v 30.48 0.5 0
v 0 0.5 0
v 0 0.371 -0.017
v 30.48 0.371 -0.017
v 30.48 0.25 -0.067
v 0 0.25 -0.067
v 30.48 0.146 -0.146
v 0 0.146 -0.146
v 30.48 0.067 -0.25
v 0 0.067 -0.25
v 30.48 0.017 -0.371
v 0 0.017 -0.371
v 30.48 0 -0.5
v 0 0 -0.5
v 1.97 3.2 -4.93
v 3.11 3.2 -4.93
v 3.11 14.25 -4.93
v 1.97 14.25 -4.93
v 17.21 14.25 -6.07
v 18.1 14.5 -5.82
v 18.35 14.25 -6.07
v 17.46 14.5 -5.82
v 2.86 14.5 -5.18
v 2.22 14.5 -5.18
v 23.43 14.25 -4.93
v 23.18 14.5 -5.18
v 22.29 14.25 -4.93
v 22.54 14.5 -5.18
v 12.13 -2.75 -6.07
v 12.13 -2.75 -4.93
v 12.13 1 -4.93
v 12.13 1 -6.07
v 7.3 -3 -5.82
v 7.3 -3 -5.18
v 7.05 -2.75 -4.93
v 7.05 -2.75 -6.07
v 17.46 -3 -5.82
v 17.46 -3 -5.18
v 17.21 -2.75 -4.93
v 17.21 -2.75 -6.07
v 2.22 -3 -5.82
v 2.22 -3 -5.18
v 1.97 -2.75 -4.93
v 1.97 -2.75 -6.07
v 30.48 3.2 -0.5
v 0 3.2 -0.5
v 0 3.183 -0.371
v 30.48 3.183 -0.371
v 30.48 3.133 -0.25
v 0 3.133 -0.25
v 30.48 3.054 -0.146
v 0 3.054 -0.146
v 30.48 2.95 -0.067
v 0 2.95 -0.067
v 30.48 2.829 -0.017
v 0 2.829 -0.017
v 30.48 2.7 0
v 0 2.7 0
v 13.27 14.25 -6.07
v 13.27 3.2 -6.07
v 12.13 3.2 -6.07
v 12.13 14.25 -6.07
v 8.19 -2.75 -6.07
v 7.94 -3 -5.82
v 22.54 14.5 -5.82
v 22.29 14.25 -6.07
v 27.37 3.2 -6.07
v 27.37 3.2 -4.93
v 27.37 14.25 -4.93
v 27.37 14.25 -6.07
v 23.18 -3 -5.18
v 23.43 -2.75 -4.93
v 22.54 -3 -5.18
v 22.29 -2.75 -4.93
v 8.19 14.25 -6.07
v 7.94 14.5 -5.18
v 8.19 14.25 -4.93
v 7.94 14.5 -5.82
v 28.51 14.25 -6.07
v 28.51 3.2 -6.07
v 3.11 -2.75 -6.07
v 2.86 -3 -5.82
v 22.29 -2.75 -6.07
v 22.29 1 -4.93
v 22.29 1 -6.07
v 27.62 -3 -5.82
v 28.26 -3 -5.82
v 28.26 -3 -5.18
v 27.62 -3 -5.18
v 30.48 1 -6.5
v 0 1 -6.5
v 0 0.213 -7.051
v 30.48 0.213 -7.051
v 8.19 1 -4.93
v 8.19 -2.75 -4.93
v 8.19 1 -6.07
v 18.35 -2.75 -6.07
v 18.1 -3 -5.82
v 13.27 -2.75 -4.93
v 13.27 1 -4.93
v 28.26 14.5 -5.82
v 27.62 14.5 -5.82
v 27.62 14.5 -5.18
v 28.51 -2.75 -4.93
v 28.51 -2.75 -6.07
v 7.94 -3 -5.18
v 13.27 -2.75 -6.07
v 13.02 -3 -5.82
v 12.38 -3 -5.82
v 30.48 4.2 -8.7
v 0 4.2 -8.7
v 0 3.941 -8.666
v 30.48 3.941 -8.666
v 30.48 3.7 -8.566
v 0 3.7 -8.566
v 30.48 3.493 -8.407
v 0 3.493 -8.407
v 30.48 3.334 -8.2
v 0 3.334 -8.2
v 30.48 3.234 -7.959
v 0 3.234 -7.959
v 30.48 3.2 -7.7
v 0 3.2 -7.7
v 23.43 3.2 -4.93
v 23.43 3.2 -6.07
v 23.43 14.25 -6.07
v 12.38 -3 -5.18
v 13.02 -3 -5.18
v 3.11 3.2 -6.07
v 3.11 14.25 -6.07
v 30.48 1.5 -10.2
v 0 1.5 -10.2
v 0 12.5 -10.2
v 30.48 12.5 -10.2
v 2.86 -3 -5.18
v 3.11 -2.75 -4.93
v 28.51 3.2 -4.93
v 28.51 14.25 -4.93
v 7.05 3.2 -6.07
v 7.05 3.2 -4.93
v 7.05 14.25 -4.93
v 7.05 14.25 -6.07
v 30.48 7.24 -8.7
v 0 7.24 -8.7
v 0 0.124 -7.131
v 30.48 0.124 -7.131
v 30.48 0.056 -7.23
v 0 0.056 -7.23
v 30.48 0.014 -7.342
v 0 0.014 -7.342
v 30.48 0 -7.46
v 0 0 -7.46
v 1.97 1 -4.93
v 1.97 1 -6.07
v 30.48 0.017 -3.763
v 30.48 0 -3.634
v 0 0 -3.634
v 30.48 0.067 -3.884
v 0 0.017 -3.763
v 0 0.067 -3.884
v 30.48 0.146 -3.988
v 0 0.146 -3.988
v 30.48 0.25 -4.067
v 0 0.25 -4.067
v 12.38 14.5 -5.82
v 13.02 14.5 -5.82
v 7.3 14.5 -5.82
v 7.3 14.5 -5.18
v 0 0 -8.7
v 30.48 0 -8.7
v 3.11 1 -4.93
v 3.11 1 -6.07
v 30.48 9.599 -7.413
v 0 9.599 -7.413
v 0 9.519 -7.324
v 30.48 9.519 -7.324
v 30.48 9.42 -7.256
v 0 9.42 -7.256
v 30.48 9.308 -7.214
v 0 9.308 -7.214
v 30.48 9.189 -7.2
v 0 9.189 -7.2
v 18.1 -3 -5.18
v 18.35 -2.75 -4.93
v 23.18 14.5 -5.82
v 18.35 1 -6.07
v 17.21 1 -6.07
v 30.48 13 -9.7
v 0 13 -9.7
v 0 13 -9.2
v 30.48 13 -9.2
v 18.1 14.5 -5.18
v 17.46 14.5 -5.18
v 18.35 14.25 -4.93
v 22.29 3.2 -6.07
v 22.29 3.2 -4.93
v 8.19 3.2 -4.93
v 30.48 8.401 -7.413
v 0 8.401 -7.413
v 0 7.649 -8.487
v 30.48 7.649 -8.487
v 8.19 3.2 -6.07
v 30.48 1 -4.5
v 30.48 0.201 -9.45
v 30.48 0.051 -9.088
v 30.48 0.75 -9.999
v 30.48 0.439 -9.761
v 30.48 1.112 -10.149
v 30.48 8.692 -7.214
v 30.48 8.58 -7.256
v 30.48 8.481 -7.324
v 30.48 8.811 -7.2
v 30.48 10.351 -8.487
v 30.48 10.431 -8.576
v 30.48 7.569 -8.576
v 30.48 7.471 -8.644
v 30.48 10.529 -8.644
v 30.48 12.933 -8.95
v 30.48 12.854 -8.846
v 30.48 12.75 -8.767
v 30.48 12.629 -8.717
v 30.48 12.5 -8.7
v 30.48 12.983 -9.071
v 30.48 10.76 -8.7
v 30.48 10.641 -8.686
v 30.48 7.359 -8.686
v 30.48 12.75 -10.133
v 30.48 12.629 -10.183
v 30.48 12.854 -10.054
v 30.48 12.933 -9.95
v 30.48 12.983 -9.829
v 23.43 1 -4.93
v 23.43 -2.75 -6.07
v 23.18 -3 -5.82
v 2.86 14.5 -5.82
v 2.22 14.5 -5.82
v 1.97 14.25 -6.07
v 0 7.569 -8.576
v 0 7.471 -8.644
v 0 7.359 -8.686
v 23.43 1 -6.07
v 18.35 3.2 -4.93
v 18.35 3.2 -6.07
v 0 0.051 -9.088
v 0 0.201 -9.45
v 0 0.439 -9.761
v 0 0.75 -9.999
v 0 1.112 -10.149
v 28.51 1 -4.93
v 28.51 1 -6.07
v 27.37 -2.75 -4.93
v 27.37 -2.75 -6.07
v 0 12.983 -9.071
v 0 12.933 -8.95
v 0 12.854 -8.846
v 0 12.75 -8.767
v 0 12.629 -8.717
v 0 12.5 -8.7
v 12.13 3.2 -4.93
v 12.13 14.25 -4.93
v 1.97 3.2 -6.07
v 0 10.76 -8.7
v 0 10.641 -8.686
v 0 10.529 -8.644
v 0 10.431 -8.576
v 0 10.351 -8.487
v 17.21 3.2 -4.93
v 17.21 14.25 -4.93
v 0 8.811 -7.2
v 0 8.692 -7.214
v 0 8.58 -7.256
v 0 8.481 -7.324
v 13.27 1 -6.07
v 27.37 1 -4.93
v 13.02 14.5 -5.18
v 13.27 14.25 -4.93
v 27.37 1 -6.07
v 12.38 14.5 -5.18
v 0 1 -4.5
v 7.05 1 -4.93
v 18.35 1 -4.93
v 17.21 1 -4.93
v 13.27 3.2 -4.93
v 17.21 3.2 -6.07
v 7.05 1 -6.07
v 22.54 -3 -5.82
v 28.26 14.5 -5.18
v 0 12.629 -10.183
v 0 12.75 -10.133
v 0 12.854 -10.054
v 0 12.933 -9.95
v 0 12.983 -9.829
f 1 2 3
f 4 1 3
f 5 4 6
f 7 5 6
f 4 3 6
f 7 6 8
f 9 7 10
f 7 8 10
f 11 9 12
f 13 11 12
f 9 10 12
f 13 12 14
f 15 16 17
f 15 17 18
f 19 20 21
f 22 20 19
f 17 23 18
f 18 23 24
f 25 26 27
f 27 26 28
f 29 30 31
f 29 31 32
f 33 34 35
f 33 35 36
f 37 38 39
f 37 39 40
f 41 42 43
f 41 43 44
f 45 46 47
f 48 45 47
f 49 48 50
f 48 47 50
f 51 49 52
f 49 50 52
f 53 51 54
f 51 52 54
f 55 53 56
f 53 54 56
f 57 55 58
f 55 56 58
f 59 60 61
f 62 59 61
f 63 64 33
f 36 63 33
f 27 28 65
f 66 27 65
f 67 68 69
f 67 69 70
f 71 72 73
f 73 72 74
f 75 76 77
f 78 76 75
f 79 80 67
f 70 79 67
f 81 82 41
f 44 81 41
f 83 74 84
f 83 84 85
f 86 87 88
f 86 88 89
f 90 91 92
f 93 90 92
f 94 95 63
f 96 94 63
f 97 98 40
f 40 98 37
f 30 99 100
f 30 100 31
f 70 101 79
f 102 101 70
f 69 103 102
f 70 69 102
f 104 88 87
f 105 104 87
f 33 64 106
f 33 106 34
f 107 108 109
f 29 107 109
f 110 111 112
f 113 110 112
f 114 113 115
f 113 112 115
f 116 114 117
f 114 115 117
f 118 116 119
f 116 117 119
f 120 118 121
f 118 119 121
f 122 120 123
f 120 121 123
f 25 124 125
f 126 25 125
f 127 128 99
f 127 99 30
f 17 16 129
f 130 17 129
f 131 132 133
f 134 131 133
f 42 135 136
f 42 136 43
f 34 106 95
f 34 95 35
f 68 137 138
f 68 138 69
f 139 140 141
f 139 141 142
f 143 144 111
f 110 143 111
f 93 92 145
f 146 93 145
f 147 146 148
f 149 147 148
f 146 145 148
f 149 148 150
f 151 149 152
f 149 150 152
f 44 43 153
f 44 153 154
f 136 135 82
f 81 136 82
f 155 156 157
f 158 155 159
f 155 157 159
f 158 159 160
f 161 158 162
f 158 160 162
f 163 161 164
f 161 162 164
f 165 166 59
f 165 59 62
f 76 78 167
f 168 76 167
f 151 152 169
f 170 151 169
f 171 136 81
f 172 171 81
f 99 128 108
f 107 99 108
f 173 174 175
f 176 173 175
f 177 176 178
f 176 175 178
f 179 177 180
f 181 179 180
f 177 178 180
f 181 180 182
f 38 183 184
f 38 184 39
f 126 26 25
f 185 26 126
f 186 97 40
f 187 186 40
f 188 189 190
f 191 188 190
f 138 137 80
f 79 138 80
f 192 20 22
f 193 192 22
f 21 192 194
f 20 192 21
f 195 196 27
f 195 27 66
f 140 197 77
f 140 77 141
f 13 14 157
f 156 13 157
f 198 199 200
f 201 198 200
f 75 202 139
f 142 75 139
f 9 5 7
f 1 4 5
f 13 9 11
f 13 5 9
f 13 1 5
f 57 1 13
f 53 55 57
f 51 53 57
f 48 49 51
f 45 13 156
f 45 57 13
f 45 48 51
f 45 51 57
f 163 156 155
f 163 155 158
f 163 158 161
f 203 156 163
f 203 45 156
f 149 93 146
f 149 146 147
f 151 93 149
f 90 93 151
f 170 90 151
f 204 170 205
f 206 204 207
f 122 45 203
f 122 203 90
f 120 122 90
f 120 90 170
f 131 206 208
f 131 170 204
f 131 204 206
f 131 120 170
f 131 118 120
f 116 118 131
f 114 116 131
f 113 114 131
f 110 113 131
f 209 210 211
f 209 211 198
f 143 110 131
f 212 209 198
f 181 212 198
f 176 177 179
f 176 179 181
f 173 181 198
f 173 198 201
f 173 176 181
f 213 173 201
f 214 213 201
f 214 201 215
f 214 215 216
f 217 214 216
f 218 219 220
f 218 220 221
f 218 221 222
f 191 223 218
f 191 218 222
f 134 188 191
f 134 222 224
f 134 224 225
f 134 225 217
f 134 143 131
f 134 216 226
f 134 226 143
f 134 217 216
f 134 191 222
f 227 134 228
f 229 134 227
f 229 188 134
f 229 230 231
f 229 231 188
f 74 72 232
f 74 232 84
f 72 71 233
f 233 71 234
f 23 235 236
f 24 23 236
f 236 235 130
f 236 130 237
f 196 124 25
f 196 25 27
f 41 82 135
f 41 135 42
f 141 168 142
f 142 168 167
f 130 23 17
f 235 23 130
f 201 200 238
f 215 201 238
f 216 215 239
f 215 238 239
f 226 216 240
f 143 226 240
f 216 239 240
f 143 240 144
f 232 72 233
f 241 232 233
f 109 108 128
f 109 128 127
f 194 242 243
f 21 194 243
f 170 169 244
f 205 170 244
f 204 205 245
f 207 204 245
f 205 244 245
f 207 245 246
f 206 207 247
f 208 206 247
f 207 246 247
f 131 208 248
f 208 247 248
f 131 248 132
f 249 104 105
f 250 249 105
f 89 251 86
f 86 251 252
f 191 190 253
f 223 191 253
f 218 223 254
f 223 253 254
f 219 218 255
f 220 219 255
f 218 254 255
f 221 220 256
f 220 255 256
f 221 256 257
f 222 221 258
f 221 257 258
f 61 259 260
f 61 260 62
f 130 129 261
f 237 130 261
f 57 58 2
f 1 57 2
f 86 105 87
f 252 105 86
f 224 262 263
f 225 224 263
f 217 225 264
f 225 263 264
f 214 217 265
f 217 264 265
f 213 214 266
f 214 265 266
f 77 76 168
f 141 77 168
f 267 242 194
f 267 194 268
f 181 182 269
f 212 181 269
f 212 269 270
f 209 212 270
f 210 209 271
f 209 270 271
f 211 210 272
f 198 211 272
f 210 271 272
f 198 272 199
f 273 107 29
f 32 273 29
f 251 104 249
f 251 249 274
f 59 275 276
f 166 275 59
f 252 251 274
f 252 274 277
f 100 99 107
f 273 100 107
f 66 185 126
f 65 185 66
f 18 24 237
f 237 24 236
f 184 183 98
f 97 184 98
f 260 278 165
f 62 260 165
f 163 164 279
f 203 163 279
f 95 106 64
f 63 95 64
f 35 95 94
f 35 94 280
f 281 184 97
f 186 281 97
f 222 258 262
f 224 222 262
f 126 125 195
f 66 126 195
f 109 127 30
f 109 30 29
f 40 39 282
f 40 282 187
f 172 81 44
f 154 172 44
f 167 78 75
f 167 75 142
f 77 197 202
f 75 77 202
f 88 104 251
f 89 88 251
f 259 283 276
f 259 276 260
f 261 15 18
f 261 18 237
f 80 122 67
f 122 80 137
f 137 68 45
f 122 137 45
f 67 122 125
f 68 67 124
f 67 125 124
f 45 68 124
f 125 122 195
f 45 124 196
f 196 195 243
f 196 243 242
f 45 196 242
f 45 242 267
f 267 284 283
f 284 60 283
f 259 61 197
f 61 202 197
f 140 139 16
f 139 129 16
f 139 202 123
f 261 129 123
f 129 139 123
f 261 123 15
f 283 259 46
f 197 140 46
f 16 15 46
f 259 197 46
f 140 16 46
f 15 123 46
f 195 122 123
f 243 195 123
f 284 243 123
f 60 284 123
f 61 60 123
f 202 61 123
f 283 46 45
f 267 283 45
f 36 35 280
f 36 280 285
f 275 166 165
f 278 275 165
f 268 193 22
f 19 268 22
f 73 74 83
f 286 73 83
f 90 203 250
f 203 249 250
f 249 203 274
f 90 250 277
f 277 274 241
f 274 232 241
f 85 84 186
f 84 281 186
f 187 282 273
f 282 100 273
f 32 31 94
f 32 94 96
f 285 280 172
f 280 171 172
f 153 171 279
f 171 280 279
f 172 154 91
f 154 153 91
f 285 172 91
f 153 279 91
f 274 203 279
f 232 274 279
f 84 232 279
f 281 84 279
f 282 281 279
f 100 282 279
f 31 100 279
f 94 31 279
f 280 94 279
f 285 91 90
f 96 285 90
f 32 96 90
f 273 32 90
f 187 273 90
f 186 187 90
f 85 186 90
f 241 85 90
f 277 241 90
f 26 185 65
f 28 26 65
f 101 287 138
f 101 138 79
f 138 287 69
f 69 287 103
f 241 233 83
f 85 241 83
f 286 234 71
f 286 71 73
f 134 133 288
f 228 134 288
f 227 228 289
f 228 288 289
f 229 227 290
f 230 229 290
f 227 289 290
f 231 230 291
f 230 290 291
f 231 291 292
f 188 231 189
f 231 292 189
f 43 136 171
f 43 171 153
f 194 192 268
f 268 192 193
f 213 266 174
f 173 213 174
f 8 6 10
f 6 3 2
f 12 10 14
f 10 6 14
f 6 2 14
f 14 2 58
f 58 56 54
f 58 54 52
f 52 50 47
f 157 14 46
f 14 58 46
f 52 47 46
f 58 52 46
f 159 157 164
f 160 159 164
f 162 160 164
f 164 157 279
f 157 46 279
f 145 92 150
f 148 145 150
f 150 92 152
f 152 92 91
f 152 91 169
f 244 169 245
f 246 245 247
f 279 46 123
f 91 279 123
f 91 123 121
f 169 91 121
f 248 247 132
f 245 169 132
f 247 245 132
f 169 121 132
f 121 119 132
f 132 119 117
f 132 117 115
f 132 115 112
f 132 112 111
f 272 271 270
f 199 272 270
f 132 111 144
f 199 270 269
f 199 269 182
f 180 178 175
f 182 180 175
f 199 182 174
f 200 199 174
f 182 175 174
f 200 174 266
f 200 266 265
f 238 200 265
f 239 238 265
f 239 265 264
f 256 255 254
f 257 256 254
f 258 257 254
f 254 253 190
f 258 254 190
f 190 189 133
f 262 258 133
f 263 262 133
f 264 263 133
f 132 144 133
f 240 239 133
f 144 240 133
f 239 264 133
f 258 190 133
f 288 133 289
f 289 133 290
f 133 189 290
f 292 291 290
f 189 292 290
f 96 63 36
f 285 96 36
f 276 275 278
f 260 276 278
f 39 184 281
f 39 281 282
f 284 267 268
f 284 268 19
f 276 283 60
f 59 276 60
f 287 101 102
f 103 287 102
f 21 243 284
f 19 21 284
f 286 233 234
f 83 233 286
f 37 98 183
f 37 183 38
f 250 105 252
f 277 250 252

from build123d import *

# Parameters (mm, degrees)
BOSS_EXTRUDE1_DEPTH        = 30.48
SKETCH2_W                  = 1.14
SKETCH2_H                  = 1.14
BOSS_EXTRUDE2_DEPTH        = 17.5
CHAMFER1_SIZE              = 0.25
CHAMFER2_SIZE              = 0.25
LPATTERN3_COUNT            = 6
LPATTERN3_PITCH            = 5.08
CHAMFER1_OF_LPATTERN3_SIZE = 0.25
CHAMFER2_OF_LPATTERN3_SIZE = 0.25


with BuildPart() as part:
    # Sketch1 → Boss-Extrude1 (new body)
    with BuildSketch(Plane(origin=(0, 0, 0), x_dir=(0, 0, -1), z_dir=(1, 0, 0))):
        with BuildLine():
            Line((0, 2.7), (0, 0.5))
            ThreePointArc((0, 0.5), (0.146446609, 0.146446609), (0.5, 0))
            Line((0.5, 0), (3.633974596, 0))
            ThreePointArc((3.633974596, 0), (3.883974596, 0.066987298), (4.066987298, 0.25))
            Line((4.066987298, 0.25), (4.5, 1))
            Line((4.5, 1), (6.5, 1))
            Line((6.5, 1), (7.050915041, 0.213211782))
            ThreePointArc((7.050915041, 0.213211782), (7.229616757, 0.056494583), (7.460491063, 0))
            Line((7.460491063, 0), (8.7, 0))
            ThreePointArc((8.7, 0), (9.760660172, 0.439339828), (10.2, 1.5))
            Line((10.2, 1.5), (10.2, 12.5))
            ThreePointArc((10.2, 12.5), (10.053553391, 12.853553391), (9.7, 13))
            Line((9.7, 13), (9.2, 13))
            ThreePointArc((9.2, 13), (8.846446609, 12.853553391), (8.7, 12.5))
            Line((8.7, 12.5), (8.7, 10.760283525))
            ThreePointArc((8.7, 10.760283525), (8.643505417, 10.529409219), (8.486788218, 10.350707503))
            Line((8.486788218, 10.350707503), (7.413211782, 9.59898119))
            ThreePointArc((7.413211782, 9.59898119), (7.256494583, 9.420279474), (7.2, 9.189405167))
            Line((7.2, 9.189405167), (7.2, 8.810594833))
            ThreePointArc((7.2, 8.810594833), (7.256494583, 8.579720526), (7.413211782, 8.40101881))
            Line((7.413211782, 8.40101881), (8.486788218, 7.649292497))
            ThreePointArc((8.486788218, 7.649292497), (8.643505417, 7.470590781), (8.7, 7.239716475))
            Line((8.7, 7.239716475), (8.7, 4.2))
            ThreePointArc((8.7, 4.2), (8.407106781, 3.492893219), (7.7, 3.2))
            Line((7.7, 3.2), (0.5, 3.2))
            ThreePointArc((0.5, 3.2), (0.146446609, 3.053553391), (0, 2.7))
        make_face()
    extrude(amount=BOSS_EXTRUDE1_DEPTH)

    # Sketch2 → Boss-Extrude2 (add)
    with BuildSketch(Plane(origin=(0, -3, 0), x_dir=(-1, 0, 0), z_dir=(0, -1, 0))):
        with Locations((-27.94, 5.5)):
            Rectangle(SKETCH2_W, SKETCH2_H)
    boss_extrude2 = extrude(amount=-BOSS_EXTRUDE2_DEPTH)

    # Chamfer1
    chamfer1_edges = [part.edges().sort_by_distance(p)[0] for p in [
        (27.37, -3, -5.5),
        (27.94, -3, -6.07),
        (28.51, -3, -5.5),
        (27.94, -3, -4.93),
    ]]
    chamfer(chamfer1_edges, length=CHAMFER1_SIZE)

    # Chamfer2
    chamfer2_edges = [part.edges().sort_by_distance(p)[0] for p in [
        (27.37, 14.5, -5.5),
        (27.94, 14.5, -4.93),
        (28.51, 14.5, -5.5),
        (27.94, 14.5, -6.07),
    ]]
    chamfer(chamfer2_edges, length=CHAMFER2_SIZE)

    # LPattern3: Boss-Extrude2 ×6
    with Locations(*[(-i * LPATTERN3_PITCH, 0, 0) for i in range(1, LPATTERN3_COUNT)]):
        add(boss_extrude2)

    # Chamfer1 of LPattern3
    chamfer1_of_lpattern3_edges = [part.edges().sort_by_distance(p)[0] for p in [
        (22.29, -3, -5.5),
        (22.86, -3, -6.07),
        (23.43, -3, -5.5),
        (22.86, -3, -4.93),
        (17.21, -3, -5.5),
        (17.78, -3, -6.07),
        (18.35, -3, -5.5),
        (17.78, -3, -4.93),
        (12.13, -3, -5.5),
        (12.7, -3, -6.07),
        (13.27, -3, -5.5),
        (12.7, -3, -4.93),
        (7.05, -3, -5.5),
        (7.62, -3, -6.07),
        (8.19, -3, -5.5),
        (7.62, -3, -4.93),
        (1.97, -3, -5.5),
        (2.54, -3, -6.07),
        (3.11, -3, -5.5),
        (2.54, -3, -4.93),
    ]]
    chamfer(chamfer1_of_lpattern3_edges, length=CHAMFER1_OF_LPATTERN3_SIZE)

    # Chamfer2 of LPattern3
    chamfer2_of_lpattern3_edges = [part.edges().sort_by_distance(p)[0] for p in [
        (22.29, 14.5, -5.5),
        (22.86, 14.5, -4.93),
        (23.43, 14.5, -5.5),
        (22.86, 14.5, -6.07),
        (17.21, 14.5, -5.5),
        (17.78, 14.5, -4.93),
        (18.35, 14.5, -5.5),
        (17.78, 14.5, -6.07),
        (12.13, 14.5, -5.5),
        (12.7, 14.5, -4.93),
        (13.27, 14.5, -5.5),
        (12.7, 14.5, -6.07),
        (7.05, 14.5, -5.5),
        (7.62, 14.5, -4.93),
        (8.19, 14.5, -5.5),
        (7.62, 14.5, -6.07),
        (1.97, 14.5, -5.5),
        (2.54, 14.5, -4.93),
        (3.11, 14.5, -5.5),
        (2.54, 14.5, -6.07),
    ]]
    chamfer(chamfer2_of_lpattern3_edges, length=CHAMFER2_OF_LPATTERN3_SIZE)


solid = part.part
